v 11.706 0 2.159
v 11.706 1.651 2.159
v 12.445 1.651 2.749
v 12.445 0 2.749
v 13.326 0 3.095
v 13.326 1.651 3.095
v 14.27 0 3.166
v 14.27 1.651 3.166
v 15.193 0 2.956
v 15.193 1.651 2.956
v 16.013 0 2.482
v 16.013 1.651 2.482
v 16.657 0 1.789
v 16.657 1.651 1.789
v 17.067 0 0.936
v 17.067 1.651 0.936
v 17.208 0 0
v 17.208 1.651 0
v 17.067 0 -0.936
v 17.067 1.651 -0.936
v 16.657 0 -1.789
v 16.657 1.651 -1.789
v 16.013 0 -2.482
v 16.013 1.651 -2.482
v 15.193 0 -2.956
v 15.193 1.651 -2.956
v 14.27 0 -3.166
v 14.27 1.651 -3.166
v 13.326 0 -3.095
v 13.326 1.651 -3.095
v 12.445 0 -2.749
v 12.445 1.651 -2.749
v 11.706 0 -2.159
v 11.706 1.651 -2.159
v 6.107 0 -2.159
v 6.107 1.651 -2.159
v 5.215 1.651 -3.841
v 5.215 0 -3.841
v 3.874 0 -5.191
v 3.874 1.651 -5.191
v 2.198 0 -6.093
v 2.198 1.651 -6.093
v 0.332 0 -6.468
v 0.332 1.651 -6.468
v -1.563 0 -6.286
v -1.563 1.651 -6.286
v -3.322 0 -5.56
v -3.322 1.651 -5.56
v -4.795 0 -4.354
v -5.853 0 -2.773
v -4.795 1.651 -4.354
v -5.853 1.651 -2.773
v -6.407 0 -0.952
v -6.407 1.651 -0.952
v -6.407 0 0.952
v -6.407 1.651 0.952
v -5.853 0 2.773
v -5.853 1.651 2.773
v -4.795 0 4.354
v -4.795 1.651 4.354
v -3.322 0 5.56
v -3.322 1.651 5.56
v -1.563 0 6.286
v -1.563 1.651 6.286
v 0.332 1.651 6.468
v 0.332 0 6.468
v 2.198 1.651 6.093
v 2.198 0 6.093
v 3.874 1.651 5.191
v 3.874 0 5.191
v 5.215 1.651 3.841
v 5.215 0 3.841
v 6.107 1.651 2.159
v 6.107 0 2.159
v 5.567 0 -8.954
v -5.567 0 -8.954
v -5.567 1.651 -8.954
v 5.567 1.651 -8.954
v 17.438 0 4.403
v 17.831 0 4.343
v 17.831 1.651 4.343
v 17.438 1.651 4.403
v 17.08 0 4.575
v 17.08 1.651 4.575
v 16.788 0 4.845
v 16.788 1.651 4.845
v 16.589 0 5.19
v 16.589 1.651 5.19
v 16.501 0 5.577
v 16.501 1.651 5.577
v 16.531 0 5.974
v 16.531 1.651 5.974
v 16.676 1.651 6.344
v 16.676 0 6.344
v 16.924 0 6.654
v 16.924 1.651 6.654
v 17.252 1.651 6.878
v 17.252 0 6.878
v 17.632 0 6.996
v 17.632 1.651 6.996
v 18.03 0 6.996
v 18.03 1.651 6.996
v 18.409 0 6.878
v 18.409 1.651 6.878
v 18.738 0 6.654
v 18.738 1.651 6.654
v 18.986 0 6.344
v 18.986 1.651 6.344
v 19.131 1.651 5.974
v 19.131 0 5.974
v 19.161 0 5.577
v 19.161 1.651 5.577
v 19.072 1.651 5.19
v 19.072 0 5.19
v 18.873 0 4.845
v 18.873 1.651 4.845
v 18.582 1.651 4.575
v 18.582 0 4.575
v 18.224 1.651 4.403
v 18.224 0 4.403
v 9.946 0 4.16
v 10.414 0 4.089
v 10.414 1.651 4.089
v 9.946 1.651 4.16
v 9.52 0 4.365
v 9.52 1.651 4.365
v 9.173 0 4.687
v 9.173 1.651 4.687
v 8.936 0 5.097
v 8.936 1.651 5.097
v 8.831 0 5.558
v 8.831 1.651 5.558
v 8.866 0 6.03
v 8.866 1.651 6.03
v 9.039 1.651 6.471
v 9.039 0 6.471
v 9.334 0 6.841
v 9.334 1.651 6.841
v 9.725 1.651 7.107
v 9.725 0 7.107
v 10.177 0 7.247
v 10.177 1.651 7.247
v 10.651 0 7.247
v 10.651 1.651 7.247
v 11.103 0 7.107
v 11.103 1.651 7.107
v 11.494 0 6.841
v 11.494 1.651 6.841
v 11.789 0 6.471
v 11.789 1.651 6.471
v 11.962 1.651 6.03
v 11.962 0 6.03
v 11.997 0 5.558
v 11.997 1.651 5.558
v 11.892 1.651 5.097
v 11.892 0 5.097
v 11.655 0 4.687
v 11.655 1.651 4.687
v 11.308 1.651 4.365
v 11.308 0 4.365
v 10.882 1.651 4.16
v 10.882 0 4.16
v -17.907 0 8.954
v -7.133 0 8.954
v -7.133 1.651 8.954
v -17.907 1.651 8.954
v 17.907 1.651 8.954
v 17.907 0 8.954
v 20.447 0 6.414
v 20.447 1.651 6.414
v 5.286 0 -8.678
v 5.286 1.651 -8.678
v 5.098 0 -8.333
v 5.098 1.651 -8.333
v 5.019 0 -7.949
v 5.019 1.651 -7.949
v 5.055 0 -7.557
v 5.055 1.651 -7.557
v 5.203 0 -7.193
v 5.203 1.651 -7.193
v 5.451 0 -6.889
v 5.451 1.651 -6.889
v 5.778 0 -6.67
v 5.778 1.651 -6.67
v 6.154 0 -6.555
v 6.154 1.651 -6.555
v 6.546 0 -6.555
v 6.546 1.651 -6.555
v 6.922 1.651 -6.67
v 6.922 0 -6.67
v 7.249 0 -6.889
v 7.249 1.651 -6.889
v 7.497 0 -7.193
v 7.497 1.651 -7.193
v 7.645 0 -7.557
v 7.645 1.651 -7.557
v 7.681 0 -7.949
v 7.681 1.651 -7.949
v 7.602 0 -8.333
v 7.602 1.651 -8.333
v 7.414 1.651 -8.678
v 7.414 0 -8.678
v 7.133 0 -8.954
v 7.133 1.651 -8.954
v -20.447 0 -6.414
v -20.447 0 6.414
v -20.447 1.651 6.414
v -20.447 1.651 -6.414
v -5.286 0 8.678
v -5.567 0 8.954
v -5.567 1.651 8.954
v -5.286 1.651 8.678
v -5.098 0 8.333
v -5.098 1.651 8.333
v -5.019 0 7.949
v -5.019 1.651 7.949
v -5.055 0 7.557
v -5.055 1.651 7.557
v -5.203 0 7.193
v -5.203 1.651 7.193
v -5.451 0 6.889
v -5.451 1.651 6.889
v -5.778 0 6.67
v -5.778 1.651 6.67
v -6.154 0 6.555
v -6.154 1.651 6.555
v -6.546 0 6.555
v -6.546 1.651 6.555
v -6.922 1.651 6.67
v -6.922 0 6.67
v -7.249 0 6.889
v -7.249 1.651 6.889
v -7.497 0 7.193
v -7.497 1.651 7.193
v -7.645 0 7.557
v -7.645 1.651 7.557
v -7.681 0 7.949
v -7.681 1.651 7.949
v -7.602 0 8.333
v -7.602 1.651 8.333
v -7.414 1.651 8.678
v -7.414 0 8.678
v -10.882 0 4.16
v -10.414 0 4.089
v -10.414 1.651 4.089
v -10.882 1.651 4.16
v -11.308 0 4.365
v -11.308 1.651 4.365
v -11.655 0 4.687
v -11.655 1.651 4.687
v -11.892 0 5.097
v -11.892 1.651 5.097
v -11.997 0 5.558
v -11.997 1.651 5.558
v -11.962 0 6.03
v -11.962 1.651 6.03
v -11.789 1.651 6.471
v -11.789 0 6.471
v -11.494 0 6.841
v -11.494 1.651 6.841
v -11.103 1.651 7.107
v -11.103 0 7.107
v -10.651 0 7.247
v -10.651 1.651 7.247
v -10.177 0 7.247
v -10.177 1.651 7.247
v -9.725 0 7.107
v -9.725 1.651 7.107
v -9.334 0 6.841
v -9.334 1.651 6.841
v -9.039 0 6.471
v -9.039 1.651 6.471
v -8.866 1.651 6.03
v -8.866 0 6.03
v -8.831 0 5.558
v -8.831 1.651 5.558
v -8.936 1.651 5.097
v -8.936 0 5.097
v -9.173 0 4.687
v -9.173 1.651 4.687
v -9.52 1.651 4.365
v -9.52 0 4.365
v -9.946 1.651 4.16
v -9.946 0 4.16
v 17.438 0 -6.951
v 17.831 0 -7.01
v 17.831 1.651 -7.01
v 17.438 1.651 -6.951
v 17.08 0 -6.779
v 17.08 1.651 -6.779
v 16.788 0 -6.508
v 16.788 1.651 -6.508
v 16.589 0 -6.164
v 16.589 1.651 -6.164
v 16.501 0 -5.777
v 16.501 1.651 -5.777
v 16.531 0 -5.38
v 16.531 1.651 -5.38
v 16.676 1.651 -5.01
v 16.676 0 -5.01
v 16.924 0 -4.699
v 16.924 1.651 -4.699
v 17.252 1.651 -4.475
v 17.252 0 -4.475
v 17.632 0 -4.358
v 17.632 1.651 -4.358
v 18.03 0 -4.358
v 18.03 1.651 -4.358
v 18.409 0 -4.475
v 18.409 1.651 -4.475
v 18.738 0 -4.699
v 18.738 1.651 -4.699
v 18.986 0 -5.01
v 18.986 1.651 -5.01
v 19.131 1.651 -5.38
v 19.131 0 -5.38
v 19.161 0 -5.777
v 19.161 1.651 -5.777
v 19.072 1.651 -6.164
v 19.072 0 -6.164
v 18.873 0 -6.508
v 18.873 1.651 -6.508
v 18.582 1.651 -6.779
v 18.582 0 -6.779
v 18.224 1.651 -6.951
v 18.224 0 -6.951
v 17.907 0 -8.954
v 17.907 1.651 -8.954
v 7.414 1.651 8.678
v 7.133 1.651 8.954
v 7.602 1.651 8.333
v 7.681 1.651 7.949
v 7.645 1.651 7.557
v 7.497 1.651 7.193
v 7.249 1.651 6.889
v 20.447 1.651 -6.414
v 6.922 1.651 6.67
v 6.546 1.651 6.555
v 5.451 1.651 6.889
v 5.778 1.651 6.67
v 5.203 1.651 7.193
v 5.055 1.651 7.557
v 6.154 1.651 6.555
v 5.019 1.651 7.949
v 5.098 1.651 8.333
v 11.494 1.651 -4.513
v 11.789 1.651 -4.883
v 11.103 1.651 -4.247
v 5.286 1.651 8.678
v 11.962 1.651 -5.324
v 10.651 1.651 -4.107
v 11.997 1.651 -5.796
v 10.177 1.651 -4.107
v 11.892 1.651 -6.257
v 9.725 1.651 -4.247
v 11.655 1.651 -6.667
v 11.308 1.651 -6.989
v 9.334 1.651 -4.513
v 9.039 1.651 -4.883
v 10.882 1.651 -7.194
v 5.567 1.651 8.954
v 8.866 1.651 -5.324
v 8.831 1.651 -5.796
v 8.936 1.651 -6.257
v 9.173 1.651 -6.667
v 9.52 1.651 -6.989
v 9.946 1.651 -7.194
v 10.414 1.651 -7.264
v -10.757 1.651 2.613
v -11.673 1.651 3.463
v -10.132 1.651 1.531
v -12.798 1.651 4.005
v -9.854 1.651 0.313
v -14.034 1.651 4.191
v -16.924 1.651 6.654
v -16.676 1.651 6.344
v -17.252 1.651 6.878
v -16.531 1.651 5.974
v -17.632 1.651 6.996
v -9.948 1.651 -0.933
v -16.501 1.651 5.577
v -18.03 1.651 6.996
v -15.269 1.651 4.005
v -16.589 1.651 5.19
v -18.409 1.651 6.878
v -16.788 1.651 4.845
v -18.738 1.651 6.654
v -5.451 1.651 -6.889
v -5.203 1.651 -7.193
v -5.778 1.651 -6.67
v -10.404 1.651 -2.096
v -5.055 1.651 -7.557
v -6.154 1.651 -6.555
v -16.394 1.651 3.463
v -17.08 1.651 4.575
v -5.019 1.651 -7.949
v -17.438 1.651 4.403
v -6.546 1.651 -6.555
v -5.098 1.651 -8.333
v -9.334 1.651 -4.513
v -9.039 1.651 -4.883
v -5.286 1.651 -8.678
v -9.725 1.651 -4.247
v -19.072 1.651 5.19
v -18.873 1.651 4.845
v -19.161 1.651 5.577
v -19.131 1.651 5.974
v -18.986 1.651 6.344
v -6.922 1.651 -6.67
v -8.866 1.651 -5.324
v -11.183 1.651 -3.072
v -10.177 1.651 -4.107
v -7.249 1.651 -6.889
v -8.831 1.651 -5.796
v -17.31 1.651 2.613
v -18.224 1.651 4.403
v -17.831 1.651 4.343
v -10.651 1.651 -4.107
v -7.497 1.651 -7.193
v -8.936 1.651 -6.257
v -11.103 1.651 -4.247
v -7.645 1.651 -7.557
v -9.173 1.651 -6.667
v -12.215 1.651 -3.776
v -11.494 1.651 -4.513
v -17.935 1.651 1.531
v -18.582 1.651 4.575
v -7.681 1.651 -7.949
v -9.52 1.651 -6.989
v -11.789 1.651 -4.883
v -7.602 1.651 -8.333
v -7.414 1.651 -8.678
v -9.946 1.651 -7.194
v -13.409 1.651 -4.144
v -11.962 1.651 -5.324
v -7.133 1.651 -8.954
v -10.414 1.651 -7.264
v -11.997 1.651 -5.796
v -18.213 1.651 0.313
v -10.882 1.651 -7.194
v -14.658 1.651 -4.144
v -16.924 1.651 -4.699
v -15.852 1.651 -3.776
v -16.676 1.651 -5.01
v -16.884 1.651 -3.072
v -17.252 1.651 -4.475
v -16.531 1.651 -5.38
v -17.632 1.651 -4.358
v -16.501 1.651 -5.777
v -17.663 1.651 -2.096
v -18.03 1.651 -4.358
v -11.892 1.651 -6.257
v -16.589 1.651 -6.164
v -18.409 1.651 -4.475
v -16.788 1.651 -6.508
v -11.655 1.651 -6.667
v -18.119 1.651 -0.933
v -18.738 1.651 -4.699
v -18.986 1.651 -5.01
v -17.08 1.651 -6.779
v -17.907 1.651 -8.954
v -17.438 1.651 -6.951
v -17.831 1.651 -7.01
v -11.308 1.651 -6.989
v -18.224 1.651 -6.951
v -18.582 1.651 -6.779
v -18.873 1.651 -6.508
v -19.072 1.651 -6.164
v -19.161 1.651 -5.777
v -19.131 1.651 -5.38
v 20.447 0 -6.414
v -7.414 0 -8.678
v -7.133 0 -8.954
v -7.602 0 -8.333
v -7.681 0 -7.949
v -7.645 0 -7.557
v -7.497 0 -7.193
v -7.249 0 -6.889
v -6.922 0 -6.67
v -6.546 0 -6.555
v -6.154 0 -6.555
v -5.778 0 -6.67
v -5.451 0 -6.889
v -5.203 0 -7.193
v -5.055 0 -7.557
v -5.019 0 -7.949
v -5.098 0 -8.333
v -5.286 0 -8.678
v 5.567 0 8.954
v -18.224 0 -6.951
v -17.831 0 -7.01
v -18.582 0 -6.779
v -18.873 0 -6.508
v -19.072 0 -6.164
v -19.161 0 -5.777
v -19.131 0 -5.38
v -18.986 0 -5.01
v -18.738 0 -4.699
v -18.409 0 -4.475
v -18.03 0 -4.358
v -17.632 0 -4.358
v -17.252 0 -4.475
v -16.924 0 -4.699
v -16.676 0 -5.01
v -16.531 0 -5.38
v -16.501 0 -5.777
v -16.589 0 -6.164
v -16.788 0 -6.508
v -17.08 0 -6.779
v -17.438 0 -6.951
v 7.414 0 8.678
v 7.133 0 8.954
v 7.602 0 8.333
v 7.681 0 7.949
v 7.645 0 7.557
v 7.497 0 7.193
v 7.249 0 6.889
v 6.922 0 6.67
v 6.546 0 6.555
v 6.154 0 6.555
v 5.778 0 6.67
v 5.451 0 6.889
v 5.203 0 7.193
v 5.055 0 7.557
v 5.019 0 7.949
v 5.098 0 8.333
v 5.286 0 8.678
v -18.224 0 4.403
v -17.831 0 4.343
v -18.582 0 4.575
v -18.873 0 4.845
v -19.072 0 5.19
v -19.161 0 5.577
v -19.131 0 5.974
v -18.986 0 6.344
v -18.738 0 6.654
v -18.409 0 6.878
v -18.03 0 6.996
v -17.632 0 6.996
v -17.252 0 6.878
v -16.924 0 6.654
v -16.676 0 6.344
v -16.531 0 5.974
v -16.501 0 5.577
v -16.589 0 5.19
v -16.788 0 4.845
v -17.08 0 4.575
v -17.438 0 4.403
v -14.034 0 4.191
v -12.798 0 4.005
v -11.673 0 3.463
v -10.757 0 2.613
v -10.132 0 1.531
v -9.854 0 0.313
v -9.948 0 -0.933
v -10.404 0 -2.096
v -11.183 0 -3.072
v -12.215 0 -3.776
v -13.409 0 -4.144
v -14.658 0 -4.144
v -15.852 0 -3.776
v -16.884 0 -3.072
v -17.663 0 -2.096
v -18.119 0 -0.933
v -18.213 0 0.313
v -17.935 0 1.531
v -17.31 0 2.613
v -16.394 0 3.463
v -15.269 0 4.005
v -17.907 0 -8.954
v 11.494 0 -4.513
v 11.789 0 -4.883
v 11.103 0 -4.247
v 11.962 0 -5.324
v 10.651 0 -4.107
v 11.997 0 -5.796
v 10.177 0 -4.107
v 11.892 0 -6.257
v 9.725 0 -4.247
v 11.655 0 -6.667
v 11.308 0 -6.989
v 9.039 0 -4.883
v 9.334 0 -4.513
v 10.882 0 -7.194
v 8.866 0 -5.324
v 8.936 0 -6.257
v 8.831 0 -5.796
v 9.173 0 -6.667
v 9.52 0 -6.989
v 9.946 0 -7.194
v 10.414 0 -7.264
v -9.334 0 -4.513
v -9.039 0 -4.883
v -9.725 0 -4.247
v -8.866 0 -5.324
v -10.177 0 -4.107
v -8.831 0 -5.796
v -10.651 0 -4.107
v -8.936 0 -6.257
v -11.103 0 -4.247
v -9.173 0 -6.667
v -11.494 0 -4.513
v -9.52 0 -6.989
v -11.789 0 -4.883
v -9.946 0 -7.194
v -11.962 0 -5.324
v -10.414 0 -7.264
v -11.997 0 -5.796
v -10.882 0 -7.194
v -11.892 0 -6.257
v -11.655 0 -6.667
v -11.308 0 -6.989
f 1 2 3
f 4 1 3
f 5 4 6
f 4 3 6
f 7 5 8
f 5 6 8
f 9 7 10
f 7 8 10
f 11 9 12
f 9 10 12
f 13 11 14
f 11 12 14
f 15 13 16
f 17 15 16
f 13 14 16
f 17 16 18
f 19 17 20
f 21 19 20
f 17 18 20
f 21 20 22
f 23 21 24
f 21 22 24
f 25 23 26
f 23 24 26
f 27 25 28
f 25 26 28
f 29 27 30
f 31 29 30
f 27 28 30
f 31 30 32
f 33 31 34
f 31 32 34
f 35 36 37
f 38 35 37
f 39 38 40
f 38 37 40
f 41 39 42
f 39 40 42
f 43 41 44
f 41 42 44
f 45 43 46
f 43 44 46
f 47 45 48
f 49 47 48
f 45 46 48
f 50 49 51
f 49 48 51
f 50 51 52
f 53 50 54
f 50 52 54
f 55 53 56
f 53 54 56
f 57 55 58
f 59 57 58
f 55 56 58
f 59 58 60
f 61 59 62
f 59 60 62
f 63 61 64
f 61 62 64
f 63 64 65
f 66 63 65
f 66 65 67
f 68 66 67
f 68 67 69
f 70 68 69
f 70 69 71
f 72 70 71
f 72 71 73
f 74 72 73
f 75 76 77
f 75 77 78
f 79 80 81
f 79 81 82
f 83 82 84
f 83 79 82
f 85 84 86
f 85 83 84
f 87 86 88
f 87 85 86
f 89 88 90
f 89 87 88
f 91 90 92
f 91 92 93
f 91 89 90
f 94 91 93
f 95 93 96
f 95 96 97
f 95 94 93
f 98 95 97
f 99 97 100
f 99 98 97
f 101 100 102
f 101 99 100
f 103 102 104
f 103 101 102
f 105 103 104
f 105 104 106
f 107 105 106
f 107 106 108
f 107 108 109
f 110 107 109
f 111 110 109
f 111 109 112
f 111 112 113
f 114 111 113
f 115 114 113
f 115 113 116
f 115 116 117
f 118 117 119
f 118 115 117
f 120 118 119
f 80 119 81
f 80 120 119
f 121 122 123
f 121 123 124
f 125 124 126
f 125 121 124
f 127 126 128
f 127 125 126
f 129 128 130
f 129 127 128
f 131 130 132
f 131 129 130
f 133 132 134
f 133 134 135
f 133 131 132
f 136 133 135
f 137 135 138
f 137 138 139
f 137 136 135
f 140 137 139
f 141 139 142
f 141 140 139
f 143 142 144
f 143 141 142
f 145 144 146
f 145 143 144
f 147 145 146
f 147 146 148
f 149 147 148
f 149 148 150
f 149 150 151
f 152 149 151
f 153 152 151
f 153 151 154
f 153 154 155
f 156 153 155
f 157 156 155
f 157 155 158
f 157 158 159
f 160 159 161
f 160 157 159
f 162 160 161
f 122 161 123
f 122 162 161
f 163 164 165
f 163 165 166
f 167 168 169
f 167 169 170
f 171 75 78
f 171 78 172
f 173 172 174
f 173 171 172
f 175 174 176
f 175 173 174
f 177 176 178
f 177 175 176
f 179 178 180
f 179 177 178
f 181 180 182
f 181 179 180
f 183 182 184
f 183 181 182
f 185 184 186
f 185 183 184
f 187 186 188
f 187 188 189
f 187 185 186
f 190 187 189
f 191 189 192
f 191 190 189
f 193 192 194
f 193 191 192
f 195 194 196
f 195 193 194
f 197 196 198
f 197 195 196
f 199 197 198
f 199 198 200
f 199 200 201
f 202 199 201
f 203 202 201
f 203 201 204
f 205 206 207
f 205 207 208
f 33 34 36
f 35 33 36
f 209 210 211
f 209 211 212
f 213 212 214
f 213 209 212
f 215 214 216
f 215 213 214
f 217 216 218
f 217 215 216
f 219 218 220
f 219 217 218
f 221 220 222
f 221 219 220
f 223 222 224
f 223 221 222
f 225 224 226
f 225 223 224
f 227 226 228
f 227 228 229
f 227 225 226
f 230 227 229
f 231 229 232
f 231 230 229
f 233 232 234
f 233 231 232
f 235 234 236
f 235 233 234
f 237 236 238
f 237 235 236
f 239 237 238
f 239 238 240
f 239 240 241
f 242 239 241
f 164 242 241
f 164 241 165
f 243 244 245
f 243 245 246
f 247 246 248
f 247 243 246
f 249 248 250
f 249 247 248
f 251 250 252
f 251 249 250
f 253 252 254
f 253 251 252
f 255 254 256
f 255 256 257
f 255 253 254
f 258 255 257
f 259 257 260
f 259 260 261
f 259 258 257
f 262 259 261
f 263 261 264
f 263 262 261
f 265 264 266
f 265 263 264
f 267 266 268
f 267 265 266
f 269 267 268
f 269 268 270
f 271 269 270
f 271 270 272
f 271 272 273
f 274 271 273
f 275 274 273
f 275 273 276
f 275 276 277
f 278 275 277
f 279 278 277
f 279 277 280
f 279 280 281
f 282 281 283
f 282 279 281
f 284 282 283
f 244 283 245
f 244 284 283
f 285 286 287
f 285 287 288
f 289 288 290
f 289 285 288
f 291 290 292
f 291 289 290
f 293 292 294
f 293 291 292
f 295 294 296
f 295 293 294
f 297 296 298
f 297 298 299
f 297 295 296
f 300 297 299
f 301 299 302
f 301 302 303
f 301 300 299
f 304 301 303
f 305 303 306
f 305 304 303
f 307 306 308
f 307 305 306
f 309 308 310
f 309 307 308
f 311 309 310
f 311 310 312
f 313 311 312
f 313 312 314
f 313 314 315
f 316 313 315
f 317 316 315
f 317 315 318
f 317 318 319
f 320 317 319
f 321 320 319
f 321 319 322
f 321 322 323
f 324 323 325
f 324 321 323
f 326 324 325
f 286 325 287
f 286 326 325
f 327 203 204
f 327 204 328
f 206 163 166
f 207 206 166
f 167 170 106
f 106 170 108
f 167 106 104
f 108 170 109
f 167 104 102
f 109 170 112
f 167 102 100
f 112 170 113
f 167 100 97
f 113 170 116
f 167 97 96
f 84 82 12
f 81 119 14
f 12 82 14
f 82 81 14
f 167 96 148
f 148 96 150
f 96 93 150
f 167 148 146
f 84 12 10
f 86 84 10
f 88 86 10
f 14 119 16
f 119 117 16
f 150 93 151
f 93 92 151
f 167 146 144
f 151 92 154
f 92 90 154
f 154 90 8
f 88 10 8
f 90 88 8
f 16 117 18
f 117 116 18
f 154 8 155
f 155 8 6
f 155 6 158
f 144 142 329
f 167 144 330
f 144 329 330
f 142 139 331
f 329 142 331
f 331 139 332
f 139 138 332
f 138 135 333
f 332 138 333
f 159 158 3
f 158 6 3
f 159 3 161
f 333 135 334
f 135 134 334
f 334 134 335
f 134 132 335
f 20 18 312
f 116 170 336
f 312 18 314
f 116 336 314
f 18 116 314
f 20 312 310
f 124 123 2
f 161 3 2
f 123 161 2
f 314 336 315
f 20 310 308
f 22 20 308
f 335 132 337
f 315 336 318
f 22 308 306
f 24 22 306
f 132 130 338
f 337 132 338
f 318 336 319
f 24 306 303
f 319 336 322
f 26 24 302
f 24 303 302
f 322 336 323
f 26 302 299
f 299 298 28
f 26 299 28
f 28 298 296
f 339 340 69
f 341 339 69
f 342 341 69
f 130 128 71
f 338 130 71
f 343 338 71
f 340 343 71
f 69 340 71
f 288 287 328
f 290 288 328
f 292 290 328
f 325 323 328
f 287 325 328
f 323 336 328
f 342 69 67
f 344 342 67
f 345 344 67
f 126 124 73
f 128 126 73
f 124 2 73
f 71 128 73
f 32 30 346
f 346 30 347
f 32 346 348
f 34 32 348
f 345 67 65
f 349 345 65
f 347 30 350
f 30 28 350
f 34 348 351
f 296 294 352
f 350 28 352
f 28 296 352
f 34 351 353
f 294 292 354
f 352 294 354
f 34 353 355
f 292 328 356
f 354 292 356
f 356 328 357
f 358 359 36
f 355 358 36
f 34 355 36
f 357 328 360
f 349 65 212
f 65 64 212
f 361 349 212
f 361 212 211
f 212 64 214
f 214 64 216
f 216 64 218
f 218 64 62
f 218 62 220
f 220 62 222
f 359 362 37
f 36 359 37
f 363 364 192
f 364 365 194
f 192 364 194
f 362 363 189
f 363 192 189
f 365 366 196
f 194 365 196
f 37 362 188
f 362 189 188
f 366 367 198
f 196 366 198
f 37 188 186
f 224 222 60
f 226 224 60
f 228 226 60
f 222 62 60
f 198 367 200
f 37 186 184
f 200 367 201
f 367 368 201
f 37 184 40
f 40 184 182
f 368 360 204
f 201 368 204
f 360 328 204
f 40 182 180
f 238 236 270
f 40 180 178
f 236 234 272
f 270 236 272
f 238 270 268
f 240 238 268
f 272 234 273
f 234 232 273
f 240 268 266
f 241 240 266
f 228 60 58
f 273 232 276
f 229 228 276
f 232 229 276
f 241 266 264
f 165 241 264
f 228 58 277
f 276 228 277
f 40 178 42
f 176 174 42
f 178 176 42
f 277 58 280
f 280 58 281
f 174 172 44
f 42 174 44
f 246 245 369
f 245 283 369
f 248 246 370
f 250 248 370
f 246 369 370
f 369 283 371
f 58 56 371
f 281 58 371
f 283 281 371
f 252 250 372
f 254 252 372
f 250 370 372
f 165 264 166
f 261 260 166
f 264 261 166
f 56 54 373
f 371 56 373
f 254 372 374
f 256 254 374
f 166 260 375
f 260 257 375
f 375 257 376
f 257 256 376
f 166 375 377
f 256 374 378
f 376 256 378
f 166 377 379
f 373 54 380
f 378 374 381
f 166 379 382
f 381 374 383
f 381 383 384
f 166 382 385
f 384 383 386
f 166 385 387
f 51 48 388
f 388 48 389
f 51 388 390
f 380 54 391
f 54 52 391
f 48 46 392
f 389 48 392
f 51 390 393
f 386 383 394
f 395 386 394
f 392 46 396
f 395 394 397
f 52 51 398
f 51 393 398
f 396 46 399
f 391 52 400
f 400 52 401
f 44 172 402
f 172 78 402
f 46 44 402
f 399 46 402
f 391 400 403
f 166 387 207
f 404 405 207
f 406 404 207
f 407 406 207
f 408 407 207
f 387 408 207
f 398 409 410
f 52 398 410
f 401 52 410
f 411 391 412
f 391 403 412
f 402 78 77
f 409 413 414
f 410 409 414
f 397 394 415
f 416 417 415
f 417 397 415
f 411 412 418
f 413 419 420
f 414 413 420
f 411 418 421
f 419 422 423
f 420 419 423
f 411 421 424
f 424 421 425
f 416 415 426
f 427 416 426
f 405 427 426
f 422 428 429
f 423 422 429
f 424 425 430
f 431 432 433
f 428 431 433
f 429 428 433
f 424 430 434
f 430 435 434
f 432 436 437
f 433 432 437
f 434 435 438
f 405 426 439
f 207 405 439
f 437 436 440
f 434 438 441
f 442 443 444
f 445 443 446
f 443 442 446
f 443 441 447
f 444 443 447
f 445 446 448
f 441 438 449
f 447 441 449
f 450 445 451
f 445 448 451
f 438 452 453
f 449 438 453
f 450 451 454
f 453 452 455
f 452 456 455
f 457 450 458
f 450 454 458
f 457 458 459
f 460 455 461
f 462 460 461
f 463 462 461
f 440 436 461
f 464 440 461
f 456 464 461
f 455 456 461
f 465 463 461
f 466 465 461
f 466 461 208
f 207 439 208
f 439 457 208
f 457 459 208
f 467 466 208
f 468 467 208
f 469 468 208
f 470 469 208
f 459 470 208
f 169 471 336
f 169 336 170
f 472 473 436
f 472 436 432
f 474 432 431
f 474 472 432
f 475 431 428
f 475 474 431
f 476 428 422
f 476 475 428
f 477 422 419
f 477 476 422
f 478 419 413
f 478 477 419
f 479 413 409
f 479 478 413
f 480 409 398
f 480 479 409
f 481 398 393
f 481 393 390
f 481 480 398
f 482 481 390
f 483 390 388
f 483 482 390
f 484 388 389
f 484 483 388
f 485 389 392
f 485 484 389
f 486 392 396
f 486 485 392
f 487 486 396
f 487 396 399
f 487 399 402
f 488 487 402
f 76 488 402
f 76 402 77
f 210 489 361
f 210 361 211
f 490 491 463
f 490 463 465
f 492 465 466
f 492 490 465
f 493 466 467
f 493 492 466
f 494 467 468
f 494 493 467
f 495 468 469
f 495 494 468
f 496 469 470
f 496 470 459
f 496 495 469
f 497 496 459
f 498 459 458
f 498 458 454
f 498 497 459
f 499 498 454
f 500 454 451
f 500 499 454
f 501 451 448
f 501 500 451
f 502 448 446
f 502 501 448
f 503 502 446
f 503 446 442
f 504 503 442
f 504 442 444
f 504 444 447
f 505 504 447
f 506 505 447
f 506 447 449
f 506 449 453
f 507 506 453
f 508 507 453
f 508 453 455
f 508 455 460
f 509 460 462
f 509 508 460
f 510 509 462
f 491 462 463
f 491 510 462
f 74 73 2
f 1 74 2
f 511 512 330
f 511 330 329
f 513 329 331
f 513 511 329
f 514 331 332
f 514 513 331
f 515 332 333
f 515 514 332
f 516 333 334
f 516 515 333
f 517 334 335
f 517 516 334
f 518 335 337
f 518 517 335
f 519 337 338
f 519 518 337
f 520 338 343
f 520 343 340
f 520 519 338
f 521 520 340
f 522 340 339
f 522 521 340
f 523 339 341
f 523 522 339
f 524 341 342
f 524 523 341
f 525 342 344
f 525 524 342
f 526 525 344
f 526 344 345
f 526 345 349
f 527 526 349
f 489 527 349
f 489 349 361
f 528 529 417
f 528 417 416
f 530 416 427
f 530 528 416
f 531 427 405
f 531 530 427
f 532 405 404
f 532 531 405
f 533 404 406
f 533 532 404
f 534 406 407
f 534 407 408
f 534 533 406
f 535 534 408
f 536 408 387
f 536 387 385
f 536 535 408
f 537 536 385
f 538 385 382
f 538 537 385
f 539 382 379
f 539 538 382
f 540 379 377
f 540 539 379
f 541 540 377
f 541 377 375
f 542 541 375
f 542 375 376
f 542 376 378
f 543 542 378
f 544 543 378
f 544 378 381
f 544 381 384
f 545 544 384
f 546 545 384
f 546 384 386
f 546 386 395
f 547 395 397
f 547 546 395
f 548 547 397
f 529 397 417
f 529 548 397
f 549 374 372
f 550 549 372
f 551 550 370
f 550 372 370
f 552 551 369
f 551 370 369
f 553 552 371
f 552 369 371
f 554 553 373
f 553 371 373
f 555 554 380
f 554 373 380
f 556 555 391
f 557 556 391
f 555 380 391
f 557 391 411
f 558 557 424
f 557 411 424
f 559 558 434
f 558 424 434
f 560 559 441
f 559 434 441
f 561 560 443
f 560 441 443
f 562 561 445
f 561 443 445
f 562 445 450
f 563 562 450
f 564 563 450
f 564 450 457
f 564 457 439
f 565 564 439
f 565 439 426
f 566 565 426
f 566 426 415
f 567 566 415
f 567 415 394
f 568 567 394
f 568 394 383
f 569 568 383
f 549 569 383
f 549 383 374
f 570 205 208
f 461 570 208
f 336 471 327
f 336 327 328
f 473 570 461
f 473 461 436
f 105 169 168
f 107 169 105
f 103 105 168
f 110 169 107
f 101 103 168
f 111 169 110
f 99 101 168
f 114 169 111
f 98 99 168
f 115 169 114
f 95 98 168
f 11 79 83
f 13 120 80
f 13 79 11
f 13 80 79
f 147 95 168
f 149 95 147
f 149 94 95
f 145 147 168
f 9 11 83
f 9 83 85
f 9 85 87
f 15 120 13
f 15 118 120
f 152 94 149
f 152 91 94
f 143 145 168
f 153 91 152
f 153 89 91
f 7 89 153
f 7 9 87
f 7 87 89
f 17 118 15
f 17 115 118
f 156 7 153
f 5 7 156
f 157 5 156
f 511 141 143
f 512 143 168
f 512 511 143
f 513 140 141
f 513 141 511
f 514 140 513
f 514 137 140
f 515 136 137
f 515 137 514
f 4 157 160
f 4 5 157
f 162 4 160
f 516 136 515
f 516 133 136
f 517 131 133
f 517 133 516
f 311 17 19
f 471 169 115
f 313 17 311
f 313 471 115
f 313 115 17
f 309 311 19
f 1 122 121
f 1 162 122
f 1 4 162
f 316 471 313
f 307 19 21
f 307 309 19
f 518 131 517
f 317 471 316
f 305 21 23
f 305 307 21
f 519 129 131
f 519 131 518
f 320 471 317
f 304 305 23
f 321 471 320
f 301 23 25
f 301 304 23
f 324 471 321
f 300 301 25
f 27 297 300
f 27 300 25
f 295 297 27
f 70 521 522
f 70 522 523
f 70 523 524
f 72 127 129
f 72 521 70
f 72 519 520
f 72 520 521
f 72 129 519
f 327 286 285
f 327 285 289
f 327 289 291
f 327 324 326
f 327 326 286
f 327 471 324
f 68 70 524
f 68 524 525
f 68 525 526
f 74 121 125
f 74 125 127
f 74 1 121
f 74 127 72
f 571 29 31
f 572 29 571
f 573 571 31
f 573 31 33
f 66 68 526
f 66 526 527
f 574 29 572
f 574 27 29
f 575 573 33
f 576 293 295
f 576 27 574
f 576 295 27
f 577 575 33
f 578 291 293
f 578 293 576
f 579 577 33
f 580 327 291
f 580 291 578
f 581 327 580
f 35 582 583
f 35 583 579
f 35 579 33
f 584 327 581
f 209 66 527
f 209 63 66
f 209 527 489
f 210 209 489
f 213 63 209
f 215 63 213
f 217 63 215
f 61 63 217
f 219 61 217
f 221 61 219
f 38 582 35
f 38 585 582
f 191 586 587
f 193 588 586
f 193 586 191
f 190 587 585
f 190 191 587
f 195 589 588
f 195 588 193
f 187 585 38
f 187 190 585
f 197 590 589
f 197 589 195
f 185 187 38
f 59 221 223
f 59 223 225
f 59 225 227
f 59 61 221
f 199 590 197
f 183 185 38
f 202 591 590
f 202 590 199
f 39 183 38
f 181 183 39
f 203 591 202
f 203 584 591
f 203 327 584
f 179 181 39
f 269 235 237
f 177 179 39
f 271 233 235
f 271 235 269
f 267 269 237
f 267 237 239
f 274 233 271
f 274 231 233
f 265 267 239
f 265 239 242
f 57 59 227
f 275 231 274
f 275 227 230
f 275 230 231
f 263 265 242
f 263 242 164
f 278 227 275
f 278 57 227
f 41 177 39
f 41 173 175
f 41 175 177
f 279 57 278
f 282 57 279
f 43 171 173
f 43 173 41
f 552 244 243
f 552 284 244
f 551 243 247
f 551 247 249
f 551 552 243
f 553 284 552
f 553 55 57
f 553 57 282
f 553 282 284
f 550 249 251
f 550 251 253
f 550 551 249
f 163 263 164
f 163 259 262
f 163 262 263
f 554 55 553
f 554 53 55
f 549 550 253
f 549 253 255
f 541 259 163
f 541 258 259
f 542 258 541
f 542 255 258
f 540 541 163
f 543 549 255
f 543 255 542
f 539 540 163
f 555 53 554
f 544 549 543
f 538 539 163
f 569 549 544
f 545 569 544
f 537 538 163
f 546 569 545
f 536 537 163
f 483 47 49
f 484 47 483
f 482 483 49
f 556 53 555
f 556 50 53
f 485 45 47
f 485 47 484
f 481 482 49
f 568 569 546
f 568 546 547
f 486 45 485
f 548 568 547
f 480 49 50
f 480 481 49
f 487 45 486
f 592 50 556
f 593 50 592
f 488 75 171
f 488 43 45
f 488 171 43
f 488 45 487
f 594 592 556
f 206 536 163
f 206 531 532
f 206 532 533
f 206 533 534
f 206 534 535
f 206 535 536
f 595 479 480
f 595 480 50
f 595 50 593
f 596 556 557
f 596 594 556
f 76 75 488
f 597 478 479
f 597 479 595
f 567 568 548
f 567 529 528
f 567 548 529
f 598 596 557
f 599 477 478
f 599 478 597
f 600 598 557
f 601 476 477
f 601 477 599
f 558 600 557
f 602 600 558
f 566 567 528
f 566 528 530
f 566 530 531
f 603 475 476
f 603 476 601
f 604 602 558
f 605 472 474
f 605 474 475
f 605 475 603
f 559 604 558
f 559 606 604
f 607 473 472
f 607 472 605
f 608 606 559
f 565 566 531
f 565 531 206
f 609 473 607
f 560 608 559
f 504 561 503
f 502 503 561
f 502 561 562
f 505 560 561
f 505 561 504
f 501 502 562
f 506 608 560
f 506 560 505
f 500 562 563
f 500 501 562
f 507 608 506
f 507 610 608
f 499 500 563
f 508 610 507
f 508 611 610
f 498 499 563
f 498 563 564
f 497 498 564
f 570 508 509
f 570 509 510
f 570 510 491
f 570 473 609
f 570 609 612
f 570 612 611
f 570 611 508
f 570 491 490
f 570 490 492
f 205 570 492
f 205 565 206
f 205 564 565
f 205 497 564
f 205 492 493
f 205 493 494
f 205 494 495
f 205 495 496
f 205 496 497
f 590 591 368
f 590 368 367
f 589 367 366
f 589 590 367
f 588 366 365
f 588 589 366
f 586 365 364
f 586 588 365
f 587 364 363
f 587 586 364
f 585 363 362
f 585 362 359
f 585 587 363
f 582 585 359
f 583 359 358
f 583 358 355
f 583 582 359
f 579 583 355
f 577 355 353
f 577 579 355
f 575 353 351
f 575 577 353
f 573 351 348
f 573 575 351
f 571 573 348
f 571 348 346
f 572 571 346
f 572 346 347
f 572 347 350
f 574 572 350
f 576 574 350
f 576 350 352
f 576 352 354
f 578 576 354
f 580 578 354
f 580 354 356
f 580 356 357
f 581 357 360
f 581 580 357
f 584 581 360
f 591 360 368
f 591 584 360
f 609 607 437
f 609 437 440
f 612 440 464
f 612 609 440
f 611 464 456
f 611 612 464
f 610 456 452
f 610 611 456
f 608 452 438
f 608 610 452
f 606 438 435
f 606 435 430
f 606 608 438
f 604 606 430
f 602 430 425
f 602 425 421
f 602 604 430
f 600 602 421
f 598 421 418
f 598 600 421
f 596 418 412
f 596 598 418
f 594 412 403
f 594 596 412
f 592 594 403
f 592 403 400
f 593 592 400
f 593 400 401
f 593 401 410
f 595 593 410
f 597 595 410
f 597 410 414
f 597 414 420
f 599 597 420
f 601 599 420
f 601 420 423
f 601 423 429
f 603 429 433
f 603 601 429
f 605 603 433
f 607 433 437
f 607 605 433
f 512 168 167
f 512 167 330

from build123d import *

# Parameters (mm, degrees)
SKETCH1_R           = 1.3335
SKETCH1_R_2         = 1.5875
BOSS_EXTRUDE1_DEPTH = 1.651
CHAMFER1_SIZE       = 2.54
SKETCH5_R           = 4.191
CUT_EXTRUDE5_DEPTH  = 23.382376376


with BuildPart() as part:
    # Sketch1 → Boss-Extrude1 (new body)
    with BuildSketch(Plane(origin=(0, 0, 0), x_dir=(1, 0, 0), z_dir=(0, 1, 0))):
        with BuildLine():
            Line((-5.567119422, 8.9535), (5.567119422, 8.9535))
            ThreePointArc((5.567119422, 8.9535), (6.35, 6.5405), (7.132880578, 8.9535))
            Line((7.132880578, 8.9535), (20.447, 8.9535))
            Line((20.447, 8.9535), (20.447, -8.9535))
            Line((20.447, -8.9535), (7.132880578, -8.9535))
            ThreePointArc((7.132880578, -8.9535), (6.35, -6.5405), (5.567119422, -8.9535))
            Line((5.567119422, -8.9535), (-5.567119422, -8.9535))
            ThreePointArc((-5.567119422, -8.9535), (-6.35, -6.5405), (-7.132880578, -8.9535))
            Line((-7.132880578, -8.9535), (-20.447, -8.9535))
            Line((-20.447, -8.9535), (-20.447, 8.9535))
            Line((-20.447, 8.9535), (-7.132880578, 8.9535))
            ThreePointArc((-7.132880578, 8.9535), (-6.35, 6.5405), (-5.567119422, 8.9535))
        make_face()
        with Locations(Location((-17.8308, 5.6769, 0), (0, 0, 90))):
            Circle(SKETCH1_R, mode=Mode.SUBTRACT)
        with Locations(Location((17.8308, 5.6769, 0), (0, 0, 90))):
            Circle(SKETCH1_R, mode=Mode.SUBTRACT)
        with Locations(Location((17.8308, -5.6769, 0), (0, 0, 90))):
            Circle(SKETCH1_R, mode=Mode.SUBTRACT)
        with Locations(Location((-17.8308, -5.6769, 0), (0, 0, 90))):
            Circle(SKETCH1_R, mode=Mode.SUBTRACT)
        with Locations(Location((-10.414, 5.6769, 0), (0, 0, 90))):
            Circle(SKETCH1_R_2, mode=Mode.SUBTRACT)
        with Locations(Location((10.414, 5.6769, 0), (0, 0, 90))):
            Circle(SKETCH1_R_2, mode=Mode.SUBTRACT)
        with Locations(Location((10.414, -5.6769, 0), (0, 0, 90))):
            Circle(SKETCH1_R_2, mode=Mode.SUBTRACT)
        with Locations(Location((-10.414, -5.6769, 0), (0, 0, 90))):
            Circle(SKETCH1_R_2, mode=Mode.SUBTRACT)
    extrude(amount=BOSS_EXTRUDE1_DEPTH)

    # Chamfer1
    chamfer1_edges = [part.edges().sort_by_distance(p)[0] for p in [
        (20.447, 0.8255, -8.9535),
        (20.447, 0.8255, 8.9535),
        (-20.447, 0.8255, 8.9535),
        (-20.447, 0.8255, -8.9535),
    ]]
    chamfer(chamfer1_edges, length=CHAMFER1_SIZE)

    # Sketch5 → Cut-Extrude5 (cut, through all)
    with BuildSketch(Plane(origin=(0, 1.651, 0), x_dir=(1, 0, 0), z_dir=(0, 1, 0))):
        with Locations(Location((-14.0335, 0, 0), (0, 0, 270))):
            Circle(SKETCH5_R)
        with BuildLine():
            Line((6.106574162, -2.159), (11.705551547, -2.159))
            ThreePointArc((11.705551547, -2.159), (17.2085, 0), (11.705551547, 2.159))
            Line((11.705551547, 2.159), (6.106574162, 2.159))
            ThreePointArc((6.106574162, 2.159), (-6.477, 0), (6.106574162, -2.159))
        make_face()
    extrude(amount=-CUT_EXTRUDE5_DEPTH, mode=Mode.SUBTRACT)


solid = part.part
